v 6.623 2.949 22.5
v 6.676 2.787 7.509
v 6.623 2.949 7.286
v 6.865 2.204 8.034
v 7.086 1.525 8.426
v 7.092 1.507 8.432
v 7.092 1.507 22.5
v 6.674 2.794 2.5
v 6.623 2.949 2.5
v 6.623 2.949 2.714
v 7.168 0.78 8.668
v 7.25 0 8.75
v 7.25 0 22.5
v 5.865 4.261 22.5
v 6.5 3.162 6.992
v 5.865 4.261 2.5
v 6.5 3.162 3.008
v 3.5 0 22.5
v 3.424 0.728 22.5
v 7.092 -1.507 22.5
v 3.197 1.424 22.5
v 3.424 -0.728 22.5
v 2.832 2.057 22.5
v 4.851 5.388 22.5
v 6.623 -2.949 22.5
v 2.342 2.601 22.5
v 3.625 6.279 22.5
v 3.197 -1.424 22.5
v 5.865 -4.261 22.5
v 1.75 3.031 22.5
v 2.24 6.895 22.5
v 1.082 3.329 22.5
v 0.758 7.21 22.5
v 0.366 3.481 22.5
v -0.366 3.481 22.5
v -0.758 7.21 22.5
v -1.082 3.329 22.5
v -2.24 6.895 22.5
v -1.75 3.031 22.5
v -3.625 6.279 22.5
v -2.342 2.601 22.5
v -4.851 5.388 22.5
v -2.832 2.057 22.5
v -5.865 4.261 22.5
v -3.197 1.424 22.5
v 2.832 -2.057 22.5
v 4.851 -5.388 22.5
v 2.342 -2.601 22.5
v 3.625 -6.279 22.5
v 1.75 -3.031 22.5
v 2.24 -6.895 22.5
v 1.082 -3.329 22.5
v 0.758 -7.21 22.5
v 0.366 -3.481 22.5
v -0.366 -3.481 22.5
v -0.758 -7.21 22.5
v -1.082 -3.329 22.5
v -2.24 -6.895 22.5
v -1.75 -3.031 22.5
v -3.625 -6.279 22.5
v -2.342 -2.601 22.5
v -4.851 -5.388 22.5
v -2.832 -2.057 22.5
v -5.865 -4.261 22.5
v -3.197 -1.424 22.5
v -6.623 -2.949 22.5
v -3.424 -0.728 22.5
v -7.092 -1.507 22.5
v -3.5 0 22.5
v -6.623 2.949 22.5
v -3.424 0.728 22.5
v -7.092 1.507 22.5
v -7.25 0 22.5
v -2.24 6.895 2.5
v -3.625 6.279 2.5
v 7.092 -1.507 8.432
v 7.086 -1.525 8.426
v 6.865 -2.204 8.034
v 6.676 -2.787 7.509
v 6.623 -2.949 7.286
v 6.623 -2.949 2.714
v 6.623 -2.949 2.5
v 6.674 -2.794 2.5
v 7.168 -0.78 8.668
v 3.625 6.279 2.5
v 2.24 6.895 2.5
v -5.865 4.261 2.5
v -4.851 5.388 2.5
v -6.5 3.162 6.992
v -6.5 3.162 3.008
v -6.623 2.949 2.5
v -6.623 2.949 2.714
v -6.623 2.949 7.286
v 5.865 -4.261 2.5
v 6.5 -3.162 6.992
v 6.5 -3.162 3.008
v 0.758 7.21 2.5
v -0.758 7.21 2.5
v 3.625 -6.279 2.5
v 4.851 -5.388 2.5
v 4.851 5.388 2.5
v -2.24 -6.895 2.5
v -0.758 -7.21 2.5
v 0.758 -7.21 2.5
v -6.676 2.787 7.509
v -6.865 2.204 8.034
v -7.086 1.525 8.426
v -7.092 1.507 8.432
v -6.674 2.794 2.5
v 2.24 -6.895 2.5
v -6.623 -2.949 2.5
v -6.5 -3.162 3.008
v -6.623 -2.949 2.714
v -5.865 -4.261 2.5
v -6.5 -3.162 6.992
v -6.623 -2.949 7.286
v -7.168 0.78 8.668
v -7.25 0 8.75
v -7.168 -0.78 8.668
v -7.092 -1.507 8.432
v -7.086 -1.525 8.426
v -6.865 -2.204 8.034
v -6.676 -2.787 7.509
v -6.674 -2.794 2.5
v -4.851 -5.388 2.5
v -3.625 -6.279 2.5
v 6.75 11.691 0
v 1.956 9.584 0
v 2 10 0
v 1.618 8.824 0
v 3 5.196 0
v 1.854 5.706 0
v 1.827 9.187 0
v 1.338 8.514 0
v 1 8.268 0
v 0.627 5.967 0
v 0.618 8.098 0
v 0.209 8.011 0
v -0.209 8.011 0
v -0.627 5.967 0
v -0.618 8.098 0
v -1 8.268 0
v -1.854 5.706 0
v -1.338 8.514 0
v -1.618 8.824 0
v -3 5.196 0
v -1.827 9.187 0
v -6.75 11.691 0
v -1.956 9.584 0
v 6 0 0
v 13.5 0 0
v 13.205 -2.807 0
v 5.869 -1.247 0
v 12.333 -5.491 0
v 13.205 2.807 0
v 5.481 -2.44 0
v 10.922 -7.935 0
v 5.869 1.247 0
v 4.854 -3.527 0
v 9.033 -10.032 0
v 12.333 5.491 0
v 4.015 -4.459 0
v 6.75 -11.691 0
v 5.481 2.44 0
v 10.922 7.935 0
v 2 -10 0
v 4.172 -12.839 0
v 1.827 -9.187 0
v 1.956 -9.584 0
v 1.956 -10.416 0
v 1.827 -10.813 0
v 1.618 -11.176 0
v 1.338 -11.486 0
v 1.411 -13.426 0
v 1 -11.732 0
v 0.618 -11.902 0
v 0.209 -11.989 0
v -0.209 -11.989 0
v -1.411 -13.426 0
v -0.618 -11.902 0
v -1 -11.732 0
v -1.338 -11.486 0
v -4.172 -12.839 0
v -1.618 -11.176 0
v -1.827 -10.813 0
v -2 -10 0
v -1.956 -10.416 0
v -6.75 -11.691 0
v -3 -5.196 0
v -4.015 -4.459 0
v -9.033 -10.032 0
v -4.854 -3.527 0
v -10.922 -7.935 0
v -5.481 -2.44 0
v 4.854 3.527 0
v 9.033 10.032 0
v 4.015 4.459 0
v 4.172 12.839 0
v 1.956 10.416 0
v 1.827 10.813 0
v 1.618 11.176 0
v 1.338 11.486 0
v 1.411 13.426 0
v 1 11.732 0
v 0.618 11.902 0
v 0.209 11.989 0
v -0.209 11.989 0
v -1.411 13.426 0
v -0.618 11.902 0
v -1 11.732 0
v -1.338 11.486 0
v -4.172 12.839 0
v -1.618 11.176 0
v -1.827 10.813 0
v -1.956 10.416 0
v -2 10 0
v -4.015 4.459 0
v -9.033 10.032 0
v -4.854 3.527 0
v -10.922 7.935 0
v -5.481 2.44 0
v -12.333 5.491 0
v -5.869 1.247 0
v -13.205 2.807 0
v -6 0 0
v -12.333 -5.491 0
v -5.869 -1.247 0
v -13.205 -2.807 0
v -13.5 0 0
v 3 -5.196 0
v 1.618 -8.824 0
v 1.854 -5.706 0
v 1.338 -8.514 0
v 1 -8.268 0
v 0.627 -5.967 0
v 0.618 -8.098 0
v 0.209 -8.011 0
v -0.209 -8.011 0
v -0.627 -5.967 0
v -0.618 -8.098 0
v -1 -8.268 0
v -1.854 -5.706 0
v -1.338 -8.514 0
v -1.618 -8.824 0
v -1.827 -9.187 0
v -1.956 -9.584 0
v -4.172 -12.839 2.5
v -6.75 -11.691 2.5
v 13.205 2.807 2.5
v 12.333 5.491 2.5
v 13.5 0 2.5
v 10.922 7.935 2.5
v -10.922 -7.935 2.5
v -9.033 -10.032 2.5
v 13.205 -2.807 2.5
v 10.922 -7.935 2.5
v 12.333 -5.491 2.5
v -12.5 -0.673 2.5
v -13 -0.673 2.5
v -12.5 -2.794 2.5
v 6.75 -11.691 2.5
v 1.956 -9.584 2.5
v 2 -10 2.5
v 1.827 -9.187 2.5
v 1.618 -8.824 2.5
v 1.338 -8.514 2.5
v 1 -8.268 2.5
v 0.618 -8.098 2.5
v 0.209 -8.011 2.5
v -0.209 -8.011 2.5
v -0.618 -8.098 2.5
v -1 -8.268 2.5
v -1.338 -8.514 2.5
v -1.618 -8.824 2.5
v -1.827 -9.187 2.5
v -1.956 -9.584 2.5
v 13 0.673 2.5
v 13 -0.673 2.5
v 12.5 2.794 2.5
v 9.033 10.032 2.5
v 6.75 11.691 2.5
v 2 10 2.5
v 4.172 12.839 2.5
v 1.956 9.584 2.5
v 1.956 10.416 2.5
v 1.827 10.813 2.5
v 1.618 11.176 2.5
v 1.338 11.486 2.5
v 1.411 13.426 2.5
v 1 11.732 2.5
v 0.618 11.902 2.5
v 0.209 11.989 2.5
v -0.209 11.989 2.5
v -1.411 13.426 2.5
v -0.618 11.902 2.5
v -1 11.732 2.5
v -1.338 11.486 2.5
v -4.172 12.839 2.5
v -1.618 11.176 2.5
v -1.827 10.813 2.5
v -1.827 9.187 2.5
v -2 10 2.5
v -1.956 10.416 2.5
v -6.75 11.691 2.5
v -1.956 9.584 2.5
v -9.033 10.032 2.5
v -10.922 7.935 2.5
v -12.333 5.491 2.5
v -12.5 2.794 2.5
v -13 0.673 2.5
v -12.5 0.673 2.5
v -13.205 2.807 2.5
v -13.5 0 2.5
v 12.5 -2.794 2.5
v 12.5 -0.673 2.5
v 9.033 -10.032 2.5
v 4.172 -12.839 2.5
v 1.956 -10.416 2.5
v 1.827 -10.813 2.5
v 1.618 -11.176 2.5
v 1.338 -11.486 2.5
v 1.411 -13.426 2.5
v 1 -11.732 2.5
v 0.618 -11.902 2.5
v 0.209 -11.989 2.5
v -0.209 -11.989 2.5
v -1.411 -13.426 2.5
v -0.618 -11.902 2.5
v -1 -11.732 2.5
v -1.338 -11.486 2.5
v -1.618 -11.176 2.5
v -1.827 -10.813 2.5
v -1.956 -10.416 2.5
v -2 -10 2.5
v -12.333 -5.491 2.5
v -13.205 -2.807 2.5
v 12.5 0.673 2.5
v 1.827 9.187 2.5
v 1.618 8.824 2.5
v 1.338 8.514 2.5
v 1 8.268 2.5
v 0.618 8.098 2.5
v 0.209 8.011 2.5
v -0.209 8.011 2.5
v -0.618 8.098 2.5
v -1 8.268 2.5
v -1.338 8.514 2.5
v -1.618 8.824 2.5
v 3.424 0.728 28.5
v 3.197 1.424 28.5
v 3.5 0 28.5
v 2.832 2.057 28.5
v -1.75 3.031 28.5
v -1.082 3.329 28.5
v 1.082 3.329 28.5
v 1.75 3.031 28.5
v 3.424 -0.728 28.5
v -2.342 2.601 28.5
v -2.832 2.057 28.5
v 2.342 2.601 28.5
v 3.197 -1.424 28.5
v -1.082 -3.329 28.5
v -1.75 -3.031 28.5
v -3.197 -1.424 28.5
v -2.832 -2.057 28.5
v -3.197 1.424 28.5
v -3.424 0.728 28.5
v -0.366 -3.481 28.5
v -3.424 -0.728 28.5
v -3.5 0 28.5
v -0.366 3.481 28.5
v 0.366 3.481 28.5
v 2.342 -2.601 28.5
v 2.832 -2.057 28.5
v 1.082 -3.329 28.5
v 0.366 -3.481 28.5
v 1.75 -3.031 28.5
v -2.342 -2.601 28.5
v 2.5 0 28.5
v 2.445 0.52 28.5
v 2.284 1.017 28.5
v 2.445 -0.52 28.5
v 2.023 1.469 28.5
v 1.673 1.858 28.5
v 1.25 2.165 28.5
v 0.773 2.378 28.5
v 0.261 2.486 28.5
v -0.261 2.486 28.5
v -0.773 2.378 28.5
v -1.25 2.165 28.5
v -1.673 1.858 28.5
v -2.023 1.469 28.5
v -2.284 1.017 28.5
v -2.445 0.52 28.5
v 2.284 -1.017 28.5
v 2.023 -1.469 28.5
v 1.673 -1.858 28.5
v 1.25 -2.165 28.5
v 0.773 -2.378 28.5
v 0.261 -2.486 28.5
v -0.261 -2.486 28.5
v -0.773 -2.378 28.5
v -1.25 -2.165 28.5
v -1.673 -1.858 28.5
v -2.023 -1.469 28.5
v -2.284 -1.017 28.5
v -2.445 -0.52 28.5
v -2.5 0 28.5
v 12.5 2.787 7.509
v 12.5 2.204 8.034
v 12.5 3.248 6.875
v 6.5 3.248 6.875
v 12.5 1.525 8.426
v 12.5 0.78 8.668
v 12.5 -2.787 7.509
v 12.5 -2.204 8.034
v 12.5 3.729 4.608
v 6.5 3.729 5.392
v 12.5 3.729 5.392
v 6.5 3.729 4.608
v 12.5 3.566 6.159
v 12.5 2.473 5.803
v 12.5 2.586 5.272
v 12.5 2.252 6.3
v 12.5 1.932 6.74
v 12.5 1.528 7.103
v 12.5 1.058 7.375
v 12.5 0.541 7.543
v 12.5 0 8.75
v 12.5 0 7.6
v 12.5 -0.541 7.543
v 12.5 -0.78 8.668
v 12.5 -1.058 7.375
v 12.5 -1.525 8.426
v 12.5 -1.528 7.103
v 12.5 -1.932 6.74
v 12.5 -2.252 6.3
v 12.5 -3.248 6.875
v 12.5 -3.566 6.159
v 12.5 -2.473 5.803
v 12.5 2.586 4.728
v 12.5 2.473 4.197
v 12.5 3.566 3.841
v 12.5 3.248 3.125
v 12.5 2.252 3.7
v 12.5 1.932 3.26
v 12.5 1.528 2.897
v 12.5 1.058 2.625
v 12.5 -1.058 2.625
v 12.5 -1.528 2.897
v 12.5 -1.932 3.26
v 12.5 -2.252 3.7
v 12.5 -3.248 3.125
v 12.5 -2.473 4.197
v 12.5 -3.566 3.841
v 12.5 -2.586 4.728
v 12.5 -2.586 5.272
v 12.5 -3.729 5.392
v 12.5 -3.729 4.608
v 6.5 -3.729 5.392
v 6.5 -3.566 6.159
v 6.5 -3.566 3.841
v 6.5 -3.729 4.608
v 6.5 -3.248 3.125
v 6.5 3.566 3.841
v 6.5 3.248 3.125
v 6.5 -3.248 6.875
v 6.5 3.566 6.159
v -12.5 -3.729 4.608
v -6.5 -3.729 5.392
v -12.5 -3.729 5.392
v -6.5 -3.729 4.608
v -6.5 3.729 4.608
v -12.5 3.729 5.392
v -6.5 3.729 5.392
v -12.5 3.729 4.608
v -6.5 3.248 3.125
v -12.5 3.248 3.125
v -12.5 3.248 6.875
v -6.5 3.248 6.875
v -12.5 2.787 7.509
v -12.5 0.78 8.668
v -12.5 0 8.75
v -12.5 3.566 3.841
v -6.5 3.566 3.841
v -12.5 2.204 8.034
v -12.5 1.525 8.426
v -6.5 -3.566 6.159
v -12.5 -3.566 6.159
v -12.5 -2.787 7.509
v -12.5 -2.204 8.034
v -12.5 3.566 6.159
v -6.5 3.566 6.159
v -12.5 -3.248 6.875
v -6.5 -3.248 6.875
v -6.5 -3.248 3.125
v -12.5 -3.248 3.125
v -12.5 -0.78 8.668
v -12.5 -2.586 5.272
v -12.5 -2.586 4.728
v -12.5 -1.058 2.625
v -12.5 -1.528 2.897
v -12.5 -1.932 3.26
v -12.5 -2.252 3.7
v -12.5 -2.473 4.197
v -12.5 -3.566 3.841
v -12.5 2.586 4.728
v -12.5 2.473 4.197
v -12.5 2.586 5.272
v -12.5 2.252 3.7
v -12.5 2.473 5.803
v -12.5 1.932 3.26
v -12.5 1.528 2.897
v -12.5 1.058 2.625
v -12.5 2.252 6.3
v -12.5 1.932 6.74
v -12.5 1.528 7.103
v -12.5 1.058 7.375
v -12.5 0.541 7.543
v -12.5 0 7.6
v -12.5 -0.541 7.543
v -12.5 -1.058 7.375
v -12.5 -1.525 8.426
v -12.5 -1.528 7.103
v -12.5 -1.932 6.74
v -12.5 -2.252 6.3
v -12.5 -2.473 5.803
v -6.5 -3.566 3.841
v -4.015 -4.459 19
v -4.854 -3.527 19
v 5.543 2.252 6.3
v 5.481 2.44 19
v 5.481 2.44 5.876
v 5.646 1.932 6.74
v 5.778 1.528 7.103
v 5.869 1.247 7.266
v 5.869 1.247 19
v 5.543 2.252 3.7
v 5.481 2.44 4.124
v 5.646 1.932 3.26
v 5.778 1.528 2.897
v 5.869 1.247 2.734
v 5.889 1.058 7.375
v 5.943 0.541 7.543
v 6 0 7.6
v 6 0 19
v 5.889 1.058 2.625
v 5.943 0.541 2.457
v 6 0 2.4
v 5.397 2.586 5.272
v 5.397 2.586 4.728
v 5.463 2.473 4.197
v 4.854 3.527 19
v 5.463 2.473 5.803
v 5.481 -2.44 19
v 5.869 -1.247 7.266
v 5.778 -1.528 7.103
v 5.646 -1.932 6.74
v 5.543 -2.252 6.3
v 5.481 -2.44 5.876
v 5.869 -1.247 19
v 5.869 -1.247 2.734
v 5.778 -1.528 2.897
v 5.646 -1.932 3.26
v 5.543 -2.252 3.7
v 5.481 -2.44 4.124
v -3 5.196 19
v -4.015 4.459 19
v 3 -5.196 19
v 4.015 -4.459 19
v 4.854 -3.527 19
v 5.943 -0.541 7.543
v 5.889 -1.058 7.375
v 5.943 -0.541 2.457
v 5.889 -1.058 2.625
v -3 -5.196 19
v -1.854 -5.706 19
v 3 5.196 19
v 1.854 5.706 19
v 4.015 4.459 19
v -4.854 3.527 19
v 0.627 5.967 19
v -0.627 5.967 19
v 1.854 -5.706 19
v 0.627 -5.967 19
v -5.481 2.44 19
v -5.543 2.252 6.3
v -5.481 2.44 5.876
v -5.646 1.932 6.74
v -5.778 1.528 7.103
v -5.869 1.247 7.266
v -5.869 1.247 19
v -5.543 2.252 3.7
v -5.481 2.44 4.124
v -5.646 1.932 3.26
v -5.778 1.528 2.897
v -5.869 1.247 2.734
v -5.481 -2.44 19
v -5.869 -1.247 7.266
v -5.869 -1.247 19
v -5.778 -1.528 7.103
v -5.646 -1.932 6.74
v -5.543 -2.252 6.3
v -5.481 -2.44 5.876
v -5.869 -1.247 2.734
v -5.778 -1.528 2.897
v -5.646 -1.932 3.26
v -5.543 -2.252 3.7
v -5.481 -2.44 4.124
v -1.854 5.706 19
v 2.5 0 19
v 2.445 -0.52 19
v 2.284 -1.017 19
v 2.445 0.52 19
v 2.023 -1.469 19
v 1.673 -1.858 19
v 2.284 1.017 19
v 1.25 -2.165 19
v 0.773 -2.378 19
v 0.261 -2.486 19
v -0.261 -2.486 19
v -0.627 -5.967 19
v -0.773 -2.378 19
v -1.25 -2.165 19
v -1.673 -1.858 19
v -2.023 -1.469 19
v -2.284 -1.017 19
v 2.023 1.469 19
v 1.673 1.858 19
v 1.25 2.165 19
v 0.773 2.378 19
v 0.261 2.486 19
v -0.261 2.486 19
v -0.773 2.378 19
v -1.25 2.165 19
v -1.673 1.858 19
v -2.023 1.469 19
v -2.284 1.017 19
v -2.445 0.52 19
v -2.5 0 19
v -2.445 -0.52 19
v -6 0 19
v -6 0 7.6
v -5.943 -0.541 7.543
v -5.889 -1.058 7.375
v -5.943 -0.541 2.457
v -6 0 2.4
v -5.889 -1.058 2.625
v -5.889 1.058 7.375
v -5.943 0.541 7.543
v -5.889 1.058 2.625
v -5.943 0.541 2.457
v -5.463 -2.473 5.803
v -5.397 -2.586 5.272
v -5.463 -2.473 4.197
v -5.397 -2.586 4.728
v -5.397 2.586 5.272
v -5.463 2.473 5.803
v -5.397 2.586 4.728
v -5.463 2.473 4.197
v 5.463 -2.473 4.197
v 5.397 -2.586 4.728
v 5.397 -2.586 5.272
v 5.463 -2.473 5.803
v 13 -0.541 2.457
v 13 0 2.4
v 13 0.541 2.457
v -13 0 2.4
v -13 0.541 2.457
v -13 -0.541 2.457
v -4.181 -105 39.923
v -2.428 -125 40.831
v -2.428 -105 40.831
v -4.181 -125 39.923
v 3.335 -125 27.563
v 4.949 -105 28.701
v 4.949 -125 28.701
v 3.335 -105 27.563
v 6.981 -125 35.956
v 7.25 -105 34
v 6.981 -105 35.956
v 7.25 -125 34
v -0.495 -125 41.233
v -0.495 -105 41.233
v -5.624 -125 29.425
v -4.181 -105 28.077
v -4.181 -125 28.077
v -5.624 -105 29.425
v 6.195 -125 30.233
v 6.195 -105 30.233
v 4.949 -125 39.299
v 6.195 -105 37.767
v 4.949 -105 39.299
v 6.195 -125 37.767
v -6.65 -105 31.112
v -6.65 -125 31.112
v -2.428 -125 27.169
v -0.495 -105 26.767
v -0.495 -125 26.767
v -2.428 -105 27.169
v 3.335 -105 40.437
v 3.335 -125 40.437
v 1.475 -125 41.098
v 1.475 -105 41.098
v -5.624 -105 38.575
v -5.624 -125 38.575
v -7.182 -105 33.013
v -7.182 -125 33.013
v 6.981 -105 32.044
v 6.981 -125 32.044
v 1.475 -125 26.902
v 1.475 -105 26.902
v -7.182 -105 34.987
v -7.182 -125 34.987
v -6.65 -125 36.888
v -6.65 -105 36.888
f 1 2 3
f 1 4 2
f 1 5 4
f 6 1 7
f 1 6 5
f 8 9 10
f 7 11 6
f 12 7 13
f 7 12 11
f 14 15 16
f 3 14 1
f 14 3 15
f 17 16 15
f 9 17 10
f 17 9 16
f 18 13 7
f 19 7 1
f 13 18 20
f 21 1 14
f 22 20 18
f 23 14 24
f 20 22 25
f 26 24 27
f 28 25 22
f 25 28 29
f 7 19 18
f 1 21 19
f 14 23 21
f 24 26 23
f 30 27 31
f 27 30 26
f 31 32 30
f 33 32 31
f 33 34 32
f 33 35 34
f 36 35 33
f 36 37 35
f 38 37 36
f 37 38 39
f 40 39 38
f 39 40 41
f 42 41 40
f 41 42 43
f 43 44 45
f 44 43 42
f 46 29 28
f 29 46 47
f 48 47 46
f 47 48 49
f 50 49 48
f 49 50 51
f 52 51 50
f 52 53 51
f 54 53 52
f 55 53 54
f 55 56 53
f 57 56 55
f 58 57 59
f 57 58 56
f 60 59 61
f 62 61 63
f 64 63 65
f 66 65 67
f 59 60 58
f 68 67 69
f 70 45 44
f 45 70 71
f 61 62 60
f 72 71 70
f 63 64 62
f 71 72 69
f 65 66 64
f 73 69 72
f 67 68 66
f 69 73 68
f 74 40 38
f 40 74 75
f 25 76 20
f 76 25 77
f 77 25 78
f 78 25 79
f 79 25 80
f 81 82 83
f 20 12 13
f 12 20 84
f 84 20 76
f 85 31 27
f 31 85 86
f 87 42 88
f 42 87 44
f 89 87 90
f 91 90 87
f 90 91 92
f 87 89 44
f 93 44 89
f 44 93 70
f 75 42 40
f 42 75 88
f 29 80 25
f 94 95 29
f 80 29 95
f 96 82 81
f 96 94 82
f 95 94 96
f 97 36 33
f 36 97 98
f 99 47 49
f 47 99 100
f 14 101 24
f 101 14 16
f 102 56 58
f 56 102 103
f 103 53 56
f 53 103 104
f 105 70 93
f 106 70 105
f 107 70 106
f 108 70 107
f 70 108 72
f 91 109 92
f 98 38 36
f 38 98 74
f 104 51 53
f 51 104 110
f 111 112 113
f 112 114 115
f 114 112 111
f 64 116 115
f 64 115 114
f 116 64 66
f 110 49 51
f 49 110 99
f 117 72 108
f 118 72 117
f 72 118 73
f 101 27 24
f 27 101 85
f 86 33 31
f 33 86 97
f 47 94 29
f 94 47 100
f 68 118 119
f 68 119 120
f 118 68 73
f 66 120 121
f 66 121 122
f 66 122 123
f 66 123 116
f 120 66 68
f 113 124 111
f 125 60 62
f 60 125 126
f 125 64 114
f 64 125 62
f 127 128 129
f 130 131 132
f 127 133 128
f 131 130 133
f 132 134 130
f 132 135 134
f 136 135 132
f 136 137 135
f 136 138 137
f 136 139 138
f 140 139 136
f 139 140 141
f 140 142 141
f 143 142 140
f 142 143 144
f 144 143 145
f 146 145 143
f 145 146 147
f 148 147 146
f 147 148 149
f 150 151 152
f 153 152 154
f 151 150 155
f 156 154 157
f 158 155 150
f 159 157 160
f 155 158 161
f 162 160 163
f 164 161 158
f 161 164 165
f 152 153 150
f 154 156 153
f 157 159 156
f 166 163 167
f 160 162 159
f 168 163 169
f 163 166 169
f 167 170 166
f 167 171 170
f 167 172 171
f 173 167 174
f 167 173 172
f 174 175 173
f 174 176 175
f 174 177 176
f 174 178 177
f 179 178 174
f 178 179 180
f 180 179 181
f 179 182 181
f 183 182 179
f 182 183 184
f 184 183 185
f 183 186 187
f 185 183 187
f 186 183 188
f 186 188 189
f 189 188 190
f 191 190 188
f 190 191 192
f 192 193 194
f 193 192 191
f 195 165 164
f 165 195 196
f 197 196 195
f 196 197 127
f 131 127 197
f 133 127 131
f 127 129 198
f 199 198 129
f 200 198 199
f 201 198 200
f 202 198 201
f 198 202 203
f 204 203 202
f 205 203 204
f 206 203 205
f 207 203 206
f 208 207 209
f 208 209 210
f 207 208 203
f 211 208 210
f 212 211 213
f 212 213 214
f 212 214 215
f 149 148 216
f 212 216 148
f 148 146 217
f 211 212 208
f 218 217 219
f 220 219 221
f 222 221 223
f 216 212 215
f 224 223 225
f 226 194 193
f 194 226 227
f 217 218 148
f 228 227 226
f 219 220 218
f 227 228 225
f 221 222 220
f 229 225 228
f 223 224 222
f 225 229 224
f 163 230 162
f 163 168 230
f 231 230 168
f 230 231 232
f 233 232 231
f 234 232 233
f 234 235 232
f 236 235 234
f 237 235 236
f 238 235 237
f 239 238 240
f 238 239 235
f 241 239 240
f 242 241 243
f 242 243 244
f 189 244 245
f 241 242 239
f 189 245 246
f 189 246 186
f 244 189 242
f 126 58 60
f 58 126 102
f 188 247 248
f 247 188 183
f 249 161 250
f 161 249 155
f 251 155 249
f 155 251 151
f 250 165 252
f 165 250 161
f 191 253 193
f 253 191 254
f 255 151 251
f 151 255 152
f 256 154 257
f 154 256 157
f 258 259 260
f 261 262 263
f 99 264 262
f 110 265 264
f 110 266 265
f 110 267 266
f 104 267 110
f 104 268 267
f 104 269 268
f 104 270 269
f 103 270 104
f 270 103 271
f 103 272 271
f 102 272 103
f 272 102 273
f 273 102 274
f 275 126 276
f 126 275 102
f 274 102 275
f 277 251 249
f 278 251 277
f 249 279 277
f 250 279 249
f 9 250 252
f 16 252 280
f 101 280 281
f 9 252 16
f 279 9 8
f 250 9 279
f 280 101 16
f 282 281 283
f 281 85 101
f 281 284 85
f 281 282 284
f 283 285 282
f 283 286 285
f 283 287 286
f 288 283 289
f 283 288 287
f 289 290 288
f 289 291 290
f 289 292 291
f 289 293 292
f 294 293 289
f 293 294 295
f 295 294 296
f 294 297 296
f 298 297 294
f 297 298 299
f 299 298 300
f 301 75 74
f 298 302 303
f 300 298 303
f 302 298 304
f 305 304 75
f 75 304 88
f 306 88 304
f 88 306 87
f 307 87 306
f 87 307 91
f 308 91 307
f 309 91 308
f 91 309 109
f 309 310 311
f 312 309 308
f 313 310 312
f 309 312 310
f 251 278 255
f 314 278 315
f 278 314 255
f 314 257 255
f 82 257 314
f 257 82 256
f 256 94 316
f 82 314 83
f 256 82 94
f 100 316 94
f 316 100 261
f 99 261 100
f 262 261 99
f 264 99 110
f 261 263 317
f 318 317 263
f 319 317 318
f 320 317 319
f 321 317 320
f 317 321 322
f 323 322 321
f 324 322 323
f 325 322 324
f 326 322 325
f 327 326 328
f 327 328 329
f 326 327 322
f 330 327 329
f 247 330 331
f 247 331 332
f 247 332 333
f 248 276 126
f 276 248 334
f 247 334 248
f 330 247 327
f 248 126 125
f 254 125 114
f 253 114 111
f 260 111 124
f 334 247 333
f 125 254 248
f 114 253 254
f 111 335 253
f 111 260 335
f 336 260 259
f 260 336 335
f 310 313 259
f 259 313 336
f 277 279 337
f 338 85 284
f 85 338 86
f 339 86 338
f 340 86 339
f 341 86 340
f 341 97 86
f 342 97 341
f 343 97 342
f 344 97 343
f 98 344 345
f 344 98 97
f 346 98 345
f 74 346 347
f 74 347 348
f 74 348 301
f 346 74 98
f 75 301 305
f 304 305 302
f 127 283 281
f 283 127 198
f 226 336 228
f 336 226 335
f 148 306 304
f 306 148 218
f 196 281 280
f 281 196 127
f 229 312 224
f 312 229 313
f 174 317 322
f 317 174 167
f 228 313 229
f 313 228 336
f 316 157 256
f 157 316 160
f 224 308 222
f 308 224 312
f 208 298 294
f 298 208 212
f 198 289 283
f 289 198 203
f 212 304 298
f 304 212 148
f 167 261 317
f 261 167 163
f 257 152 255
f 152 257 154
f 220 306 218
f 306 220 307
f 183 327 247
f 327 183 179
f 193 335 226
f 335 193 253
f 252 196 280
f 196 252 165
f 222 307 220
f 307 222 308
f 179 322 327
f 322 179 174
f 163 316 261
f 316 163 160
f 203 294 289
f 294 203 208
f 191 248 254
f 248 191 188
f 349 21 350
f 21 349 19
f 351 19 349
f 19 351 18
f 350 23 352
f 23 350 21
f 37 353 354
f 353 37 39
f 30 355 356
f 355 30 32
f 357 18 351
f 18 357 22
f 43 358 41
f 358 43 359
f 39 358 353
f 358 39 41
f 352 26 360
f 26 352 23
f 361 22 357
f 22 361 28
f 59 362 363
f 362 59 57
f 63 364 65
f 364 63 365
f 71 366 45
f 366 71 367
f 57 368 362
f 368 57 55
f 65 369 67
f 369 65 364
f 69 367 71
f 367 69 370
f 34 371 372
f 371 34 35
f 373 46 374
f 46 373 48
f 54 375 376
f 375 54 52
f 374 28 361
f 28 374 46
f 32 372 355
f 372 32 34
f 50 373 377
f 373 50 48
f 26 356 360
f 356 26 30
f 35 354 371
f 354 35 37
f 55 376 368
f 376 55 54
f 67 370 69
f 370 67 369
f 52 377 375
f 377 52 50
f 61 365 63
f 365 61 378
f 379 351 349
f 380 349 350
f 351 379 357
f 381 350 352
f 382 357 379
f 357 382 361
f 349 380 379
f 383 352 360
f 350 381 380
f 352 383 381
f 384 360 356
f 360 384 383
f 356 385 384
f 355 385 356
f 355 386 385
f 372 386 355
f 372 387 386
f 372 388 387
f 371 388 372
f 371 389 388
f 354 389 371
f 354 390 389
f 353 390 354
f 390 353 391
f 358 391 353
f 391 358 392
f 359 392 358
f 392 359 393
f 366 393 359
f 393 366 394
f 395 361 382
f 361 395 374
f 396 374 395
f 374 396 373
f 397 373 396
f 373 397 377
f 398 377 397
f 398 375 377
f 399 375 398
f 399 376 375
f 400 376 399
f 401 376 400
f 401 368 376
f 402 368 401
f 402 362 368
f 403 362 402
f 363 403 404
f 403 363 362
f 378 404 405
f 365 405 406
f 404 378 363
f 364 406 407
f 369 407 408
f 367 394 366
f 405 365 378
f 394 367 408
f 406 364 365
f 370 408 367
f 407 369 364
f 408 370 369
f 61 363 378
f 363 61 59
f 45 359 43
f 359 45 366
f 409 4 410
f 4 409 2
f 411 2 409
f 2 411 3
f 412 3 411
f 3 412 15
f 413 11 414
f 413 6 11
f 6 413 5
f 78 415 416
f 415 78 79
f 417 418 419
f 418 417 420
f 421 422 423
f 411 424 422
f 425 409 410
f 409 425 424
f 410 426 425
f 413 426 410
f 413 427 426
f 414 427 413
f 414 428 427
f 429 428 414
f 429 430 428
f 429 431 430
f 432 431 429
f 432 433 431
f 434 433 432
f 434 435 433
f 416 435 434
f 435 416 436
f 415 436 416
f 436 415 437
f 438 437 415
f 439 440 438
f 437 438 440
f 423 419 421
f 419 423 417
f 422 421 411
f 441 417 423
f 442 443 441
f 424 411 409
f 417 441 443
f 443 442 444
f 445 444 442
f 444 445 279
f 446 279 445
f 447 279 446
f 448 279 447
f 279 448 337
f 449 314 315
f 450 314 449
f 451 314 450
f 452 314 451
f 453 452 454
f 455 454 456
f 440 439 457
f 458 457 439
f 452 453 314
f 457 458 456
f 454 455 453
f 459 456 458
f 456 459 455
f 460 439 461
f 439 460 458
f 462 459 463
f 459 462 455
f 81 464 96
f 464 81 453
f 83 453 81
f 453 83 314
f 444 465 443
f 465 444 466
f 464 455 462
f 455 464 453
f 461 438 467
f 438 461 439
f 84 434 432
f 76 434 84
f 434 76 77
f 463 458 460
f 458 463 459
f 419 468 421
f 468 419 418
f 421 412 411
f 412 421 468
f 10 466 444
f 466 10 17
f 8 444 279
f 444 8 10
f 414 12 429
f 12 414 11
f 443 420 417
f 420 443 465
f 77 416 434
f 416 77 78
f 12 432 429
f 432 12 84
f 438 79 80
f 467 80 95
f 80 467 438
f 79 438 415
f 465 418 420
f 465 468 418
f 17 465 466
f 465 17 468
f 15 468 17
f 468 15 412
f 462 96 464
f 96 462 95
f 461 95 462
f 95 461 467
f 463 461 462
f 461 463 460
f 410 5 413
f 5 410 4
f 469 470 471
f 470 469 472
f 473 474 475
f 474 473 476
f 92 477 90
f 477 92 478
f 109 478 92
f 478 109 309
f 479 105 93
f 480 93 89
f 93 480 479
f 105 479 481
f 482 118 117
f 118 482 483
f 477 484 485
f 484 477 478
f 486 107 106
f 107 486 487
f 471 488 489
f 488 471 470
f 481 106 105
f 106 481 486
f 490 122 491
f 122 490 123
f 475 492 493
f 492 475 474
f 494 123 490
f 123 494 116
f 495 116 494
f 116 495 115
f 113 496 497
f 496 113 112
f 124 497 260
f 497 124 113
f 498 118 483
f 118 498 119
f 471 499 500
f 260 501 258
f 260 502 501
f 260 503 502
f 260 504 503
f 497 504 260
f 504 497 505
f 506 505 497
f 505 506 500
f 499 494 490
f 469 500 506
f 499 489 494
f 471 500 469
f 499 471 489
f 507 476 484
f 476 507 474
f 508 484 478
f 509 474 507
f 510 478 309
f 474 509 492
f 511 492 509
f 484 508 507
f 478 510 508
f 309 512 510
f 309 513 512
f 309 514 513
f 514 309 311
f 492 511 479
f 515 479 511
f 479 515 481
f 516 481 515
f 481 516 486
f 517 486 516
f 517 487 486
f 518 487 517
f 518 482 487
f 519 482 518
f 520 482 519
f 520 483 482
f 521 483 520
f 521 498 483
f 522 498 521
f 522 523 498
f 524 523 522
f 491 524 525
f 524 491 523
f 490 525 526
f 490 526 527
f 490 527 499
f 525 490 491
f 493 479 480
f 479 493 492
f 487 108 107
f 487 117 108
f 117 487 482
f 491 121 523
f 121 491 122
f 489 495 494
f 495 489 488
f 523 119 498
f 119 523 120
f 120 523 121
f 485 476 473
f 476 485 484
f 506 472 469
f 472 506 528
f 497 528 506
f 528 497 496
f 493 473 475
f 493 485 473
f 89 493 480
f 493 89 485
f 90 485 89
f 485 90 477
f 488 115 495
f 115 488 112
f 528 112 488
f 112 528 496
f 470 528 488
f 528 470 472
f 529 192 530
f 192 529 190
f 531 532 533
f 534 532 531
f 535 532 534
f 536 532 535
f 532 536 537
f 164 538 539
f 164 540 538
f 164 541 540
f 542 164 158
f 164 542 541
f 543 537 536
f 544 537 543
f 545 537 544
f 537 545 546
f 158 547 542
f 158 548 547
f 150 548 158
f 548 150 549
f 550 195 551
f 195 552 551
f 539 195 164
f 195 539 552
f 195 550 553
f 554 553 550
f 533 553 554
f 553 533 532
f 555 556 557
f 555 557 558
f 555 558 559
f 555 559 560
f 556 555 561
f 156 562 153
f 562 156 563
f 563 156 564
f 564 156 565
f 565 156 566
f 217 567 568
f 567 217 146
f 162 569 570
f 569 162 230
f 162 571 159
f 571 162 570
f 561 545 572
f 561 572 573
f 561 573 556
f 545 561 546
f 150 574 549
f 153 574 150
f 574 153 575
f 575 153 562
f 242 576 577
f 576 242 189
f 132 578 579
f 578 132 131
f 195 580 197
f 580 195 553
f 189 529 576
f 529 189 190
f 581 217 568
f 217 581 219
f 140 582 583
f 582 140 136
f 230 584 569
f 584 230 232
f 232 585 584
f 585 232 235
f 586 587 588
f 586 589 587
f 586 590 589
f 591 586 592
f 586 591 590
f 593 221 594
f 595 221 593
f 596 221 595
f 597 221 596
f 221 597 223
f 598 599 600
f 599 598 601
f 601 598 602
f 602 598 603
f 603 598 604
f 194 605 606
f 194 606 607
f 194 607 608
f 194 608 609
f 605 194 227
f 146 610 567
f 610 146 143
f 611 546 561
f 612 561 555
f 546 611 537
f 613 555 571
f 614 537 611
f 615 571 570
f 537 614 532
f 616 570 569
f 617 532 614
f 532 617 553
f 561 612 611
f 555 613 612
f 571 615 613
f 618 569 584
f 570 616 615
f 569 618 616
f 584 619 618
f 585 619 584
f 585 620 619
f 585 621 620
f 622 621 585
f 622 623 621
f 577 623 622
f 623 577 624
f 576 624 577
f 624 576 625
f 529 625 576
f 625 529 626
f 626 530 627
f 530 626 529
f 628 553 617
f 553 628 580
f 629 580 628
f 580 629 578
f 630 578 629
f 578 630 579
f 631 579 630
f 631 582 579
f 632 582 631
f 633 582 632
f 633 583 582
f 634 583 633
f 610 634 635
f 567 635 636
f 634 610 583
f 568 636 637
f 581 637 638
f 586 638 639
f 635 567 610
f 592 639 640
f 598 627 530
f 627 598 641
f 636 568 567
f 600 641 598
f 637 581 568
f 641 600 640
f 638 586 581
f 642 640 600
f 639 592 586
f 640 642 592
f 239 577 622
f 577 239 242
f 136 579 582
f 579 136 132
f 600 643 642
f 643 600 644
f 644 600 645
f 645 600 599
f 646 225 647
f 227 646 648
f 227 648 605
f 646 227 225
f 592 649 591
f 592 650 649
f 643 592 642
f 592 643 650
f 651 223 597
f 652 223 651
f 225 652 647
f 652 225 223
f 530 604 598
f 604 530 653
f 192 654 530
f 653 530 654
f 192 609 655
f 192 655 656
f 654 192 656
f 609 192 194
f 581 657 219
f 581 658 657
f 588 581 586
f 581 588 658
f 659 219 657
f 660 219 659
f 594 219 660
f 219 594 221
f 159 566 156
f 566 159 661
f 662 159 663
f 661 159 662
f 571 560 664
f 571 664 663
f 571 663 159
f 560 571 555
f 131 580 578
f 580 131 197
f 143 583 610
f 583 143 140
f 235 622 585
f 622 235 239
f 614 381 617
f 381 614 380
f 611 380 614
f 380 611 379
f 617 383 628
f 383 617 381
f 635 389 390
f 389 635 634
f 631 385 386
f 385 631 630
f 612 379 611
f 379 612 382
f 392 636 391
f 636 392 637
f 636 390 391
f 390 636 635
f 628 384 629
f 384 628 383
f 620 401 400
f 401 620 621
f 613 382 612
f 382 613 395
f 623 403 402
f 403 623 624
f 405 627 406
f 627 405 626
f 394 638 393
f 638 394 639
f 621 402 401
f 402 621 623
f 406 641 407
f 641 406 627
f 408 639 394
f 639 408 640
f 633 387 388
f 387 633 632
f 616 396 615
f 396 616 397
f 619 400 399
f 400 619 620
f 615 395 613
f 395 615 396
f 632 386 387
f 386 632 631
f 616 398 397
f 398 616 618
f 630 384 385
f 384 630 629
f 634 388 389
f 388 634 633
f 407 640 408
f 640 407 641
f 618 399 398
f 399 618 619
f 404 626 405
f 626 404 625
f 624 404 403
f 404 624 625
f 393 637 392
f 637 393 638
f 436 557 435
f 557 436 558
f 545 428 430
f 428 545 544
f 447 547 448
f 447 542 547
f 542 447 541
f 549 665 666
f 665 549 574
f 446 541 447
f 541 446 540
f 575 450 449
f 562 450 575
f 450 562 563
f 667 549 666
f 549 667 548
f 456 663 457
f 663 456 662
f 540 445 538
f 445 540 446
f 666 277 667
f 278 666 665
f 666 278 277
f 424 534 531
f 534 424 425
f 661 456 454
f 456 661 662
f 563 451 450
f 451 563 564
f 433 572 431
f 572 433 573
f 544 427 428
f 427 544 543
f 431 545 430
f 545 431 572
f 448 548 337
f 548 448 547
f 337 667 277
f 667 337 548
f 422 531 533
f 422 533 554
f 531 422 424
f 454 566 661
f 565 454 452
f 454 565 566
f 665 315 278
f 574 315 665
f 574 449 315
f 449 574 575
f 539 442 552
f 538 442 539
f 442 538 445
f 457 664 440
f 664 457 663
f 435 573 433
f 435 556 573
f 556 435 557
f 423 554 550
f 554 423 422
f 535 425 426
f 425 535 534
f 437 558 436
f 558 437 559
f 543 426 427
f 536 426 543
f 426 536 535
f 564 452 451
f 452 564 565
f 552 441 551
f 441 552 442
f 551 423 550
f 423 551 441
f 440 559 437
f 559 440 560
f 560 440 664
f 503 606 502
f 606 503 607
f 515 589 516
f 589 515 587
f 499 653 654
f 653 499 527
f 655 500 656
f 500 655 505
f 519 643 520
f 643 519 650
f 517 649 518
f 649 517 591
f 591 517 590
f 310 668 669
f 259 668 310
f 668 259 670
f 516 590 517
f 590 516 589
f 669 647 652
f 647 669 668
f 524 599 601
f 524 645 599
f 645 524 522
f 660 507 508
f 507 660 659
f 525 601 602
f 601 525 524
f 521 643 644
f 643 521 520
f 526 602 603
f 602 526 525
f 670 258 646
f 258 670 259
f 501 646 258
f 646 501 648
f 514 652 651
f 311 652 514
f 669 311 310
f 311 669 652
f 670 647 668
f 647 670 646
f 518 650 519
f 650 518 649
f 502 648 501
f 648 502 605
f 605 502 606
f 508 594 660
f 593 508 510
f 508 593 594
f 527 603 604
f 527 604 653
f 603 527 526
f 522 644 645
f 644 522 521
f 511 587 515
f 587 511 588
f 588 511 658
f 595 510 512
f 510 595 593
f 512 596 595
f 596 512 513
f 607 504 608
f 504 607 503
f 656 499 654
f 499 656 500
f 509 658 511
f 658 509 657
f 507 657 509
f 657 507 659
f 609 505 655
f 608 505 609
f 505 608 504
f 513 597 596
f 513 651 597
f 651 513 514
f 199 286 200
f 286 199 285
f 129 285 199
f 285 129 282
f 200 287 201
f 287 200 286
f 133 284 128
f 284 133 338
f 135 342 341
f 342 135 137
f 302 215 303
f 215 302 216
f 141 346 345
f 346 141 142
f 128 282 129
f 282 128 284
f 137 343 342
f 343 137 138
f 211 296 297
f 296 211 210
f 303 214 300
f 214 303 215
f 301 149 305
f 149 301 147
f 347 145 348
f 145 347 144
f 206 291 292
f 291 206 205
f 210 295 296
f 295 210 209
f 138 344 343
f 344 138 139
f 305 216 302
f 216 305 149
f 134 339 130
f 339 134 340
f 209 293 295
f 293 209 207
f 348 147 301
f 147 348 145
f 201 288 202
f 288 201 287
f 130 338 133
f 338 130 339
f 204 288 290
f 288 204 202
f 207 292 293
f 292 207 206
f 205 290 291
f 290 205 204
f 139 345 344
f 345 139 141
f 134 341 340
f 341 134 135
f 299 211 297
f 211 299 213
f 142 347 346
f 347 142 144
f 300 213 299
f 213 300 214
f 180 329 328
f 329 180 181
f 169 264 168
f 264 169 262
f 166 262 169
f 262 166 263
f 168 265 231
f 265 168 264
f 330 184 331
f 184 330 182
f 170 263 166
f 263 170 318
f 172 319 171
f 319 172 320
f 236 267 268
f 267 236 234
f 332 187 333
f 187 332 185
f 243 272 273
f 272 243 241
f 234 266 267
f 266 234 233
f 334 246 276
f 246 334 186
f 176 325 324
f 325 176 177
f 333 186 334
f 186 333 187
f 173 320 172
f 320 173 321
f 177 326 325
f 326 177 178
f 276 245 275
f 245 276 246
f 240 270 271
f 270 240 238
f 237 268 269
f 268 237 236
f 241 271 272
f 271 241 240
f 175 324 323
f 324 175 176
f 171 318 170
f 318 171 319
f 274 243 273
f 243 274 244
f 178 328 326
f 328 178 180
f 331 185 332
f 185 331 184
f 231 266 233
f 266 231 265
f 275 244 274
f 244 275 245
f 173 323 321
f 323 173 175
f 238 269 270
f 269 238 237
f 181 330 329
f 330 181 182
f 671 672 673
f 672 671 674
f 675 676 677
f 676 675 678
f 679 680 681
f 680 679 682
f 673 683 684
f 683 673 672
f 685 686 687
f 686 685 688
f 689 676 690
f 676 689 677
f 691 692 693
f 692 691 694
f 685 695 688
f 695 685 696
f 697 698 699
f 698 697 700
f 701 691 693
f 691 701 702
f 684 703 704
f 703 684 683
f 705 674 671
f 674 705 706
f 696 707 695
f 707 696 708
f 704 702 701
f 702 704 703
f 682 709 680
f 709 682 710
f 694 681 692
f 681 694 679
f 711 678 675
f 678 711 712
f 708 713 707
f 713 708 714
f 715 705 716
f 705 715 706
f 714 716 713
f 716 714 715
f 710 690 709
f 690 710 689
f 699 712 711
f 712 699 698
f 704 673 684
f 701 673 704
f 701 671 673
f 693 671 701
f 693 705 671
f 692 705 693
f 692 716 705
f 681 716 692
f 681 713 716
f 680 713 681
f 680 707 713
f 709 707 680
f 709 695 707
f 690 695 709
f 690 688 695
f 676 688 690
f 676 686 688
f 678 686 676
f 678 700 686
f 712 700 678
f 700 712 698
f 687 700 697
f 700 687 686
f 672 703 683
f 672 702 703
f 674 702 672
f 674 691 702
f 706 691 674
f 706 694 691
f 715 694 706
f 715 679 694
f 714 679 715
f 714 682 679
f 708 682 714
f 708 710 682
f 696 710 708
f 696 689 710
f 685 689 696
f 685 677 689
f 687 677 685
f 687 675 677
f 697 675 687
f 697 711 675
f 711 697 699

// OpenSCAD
screwD = 4;

noseHoleD = 12;
noseHoleH = 20;
tolerance = 0.1;

ledD = 5;
ledH = 6;
wallT = 2.5;

backWallL = 170;
backWallD = 250;
backWallH = 170;

pokeAreaH = 80;


module nosePoke(){
    $fn=30;
difference(){
union(){
cylinder(d=noseHoleD+wallT,h=noseHoleH+wallT);
cylinder(d=noseHoleD+2*screwD+7,h=wallT);
translate([0,0,noseHoleH+wallT]){
cylinder(d=ledD+2,h=ledH);
}//end translate

translate([(noseHoleD+1)/2,0,ledD]){
rotate([0,90,0]){
    cylinder(d=ledD+wallT,h=ledH);
}//end rotate
}//end translate

translate([-(noseHoleD+1)/2,0,ledD]){
rotate([0,-90,0]){
    cylinder(d=ledD+wallT,h=ledH);
}//end rotate
}//end translate
}//end union


translate([0,0,-1]){
cylinder(d=noseHoleD,h=noseHoleH);
cylinder(d=ledD,h=ledH+noseHoleH+wallT+5);
}//end translate

translate([(noseHoleD+1)/2-wallT,0,ledD]){
rotate([0,90,0]){
    cylinder(d=ledD+2*tolerance,h=ledH+3);
}//end rotate
}//end translate

translate([-(noseHoleD+1)/2+wallT,0,ledD]){
rotate([0,-90,0]){
    cylinder(d=ledD+2*tolerance,h=ledH+3);
}//end rotate
}//end translate

translate([0,(noseHoleD)/2+screwD,-1]){
cylinder(d=screwD,h=10);
}//end translate

translate([0,-(noseHoleD)/2-screwD,-1]){
cylinder(d=screwD,h=10);
}//end translate
}//end difference
}//end module



module backWall(){
    $fn=14;
    
    
    difference(){
    
    cylinder(d=backWallD,h=pokeAreaH);
    
    union(){
    translate([0,0,-1]){
    
        cylinder(d=backWallD-15,h=pokeAreaH+2);
        
    }//end transalte

    translate([-backWallD/2,0,-1]){
    cube([backWallD+4,backWallD,pokeAreaH+2]);
    }//end translate
}//end union
}//end difference
    }//end module
//backWall(); 
  translate([0,-(backWallD)/2+20,pokeAreaH/2-noseHoleD/2]){ 
     rotate([90,0,0]){ 
    cylinder(d=noseHoleD+wallT,h=20);
     }//end rotate
  }//end translate
  
  nosePoke();
